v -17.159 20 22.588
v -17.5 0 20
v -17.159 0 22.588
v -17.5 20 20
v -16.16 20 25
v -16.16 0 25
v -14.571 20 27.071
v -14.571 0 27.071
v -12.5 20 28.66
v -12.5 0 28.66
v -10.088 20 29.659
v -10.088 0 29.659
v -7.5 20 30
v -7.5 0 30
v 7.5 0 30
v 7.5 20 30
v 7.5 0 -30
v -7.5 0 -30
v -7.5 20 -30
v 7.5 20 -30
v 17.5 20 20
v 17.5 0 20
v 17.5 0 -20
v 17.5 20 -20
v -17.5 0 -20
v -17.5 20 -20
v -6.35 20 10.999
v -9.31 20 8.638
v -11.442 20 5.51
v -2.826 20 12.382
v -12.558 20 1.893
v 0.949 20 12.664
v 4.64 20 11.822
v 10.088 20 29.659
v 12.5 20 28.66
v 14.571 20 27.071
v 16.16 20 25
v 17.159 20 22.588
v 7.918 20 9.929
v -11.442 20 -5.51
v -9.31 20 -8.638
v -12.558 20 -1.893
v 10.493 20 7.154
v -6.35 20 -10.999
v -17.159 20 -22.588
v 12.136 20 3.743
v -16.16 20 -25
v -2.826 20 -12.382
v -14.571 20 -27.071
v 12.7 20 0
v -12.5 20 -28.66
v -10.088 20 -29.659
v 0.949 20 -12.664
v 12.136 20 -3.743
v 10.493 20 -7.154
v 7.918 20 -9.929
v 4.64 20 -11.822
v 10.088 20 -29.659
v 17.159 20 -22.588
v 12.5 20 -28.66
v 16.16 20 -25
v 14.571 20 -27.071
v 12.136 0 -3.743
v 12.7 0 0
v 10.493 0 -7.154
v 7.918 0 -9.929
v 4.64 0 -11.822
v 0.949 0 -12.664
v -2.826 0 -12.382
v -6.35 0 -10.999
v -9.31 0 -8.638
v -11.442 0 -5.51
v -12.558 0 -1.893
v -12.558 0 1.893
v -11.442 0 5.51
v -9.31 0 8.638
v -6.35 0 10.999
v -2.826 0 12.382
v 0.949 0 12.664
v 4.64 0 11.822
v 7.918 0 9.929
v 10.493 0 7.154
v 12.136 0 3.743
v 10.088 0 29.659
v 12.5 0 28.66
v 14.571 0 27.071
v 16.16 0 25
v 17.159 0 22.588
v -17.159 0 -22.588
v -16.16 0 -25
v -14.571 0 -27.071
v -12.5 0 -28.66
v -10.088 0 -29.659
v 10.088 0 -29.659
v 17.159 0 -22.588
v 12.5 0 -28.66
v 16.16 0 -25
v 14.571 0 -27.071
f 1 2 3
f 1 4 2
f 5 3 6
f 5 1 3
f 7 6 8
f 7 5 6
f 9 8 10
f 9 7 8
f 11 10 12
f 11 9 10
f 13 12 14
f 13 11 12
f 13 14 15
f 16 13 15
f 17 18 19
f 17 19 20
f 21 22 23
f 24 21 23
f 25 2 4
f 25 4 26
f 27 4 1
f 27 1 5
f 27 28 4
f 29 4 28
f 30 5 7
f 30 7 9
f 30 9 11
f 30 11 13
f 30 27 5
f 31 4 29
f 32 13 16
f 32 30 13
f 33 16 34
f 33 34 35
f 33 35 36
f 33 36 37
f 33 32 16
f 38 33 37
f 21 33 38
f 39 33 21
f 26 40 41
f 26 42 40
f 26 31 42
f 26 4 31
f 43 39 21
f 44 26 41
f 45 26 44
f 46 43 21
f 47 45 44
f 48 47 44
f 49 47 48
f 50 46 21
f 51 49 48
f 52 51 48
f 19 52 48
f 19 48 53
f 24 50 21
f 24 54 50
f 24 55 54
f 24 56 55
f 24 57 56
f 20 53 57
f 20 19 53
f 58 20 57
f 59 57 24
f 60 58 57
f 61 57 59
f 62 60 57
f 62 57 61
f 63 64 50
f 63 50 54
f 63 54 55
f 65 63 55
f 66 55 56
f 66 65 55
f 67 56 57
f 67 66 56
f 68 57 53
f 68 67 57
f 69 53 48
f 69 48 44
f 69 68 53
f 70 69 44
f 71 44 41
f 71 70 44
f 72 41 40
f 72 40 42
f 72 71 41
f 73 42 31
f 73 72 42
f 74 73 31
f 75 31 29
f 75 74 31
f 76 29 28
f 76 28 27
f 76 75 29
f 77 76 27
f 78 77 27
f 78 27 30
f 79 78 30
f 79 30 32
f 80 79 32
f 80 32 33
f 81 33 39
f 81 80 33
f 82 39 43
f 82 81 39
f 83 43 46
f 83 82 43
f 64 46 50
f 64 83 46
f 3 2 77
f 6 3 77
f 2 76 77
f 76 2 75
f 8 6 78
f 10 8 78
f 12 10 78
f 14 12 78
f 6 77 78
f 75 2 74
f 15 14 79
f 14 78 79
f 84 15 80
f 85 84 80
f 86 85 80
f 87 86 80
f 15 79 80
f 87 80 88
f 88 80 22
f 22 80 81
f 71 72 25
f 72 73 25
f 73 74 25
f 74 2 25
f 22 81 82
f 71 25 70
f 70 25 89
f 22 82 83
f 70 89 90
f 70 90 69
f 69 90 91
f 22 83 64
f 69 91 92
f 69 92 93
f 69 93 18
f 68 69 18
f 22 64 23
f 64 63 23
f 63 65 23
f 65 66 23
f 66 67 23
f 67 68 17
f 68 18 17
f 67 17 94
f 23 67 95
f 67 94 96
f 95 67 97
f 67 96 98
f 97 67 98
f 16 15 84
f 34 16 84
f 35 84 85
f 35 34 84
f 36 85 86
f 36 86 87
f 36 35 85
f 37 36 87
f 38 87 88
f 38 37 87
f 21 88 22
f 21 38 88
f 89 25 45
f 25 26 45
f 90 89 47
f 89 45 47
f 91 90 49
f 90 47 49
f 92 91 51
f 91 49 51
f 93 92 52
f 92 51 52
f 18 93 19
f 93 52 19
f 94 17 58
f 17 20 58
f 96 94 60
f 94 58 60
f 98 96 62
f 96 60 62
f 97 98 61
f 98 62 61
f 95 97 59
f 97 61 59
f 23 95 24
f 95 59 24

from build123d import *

# Parameters (mm, degrees)
SKETCH1_W           = 35
SKETCH1_H           = 60
SKETCH1_R           = 12.7
BOSS_EXTRUDE1_DEPTH = 20
FILLET1_R           = 10


with BuildPart() as part:
    # Sketch1 → Boss-Extrude1 (new body)
    with BuildSketch(Plane(origin=(0, 0, 0), x_dir=(1, 0, 0), z_dir=(0, 1, 0))):
        Rectangle(SKETCH1_W, SKETCH1_H)
        Circle(SKETCH1_R, mode=Mode.SUBTRACT)
    extrude(amount=BOSS_EXTRUDE1_DEPTH)

    # Fillet1
    fillet1_edges = [part.edges().sort_by_distance(p)[0] for p in [
        (17.5, 10, 30),
        (-17.5, 10, 30),
        (-17.5, 10, -30),
        (17.5, 10, -30),
    ]]
    fillet(fillet1_edges, radius=FILLET1_R)


solid = part.part
